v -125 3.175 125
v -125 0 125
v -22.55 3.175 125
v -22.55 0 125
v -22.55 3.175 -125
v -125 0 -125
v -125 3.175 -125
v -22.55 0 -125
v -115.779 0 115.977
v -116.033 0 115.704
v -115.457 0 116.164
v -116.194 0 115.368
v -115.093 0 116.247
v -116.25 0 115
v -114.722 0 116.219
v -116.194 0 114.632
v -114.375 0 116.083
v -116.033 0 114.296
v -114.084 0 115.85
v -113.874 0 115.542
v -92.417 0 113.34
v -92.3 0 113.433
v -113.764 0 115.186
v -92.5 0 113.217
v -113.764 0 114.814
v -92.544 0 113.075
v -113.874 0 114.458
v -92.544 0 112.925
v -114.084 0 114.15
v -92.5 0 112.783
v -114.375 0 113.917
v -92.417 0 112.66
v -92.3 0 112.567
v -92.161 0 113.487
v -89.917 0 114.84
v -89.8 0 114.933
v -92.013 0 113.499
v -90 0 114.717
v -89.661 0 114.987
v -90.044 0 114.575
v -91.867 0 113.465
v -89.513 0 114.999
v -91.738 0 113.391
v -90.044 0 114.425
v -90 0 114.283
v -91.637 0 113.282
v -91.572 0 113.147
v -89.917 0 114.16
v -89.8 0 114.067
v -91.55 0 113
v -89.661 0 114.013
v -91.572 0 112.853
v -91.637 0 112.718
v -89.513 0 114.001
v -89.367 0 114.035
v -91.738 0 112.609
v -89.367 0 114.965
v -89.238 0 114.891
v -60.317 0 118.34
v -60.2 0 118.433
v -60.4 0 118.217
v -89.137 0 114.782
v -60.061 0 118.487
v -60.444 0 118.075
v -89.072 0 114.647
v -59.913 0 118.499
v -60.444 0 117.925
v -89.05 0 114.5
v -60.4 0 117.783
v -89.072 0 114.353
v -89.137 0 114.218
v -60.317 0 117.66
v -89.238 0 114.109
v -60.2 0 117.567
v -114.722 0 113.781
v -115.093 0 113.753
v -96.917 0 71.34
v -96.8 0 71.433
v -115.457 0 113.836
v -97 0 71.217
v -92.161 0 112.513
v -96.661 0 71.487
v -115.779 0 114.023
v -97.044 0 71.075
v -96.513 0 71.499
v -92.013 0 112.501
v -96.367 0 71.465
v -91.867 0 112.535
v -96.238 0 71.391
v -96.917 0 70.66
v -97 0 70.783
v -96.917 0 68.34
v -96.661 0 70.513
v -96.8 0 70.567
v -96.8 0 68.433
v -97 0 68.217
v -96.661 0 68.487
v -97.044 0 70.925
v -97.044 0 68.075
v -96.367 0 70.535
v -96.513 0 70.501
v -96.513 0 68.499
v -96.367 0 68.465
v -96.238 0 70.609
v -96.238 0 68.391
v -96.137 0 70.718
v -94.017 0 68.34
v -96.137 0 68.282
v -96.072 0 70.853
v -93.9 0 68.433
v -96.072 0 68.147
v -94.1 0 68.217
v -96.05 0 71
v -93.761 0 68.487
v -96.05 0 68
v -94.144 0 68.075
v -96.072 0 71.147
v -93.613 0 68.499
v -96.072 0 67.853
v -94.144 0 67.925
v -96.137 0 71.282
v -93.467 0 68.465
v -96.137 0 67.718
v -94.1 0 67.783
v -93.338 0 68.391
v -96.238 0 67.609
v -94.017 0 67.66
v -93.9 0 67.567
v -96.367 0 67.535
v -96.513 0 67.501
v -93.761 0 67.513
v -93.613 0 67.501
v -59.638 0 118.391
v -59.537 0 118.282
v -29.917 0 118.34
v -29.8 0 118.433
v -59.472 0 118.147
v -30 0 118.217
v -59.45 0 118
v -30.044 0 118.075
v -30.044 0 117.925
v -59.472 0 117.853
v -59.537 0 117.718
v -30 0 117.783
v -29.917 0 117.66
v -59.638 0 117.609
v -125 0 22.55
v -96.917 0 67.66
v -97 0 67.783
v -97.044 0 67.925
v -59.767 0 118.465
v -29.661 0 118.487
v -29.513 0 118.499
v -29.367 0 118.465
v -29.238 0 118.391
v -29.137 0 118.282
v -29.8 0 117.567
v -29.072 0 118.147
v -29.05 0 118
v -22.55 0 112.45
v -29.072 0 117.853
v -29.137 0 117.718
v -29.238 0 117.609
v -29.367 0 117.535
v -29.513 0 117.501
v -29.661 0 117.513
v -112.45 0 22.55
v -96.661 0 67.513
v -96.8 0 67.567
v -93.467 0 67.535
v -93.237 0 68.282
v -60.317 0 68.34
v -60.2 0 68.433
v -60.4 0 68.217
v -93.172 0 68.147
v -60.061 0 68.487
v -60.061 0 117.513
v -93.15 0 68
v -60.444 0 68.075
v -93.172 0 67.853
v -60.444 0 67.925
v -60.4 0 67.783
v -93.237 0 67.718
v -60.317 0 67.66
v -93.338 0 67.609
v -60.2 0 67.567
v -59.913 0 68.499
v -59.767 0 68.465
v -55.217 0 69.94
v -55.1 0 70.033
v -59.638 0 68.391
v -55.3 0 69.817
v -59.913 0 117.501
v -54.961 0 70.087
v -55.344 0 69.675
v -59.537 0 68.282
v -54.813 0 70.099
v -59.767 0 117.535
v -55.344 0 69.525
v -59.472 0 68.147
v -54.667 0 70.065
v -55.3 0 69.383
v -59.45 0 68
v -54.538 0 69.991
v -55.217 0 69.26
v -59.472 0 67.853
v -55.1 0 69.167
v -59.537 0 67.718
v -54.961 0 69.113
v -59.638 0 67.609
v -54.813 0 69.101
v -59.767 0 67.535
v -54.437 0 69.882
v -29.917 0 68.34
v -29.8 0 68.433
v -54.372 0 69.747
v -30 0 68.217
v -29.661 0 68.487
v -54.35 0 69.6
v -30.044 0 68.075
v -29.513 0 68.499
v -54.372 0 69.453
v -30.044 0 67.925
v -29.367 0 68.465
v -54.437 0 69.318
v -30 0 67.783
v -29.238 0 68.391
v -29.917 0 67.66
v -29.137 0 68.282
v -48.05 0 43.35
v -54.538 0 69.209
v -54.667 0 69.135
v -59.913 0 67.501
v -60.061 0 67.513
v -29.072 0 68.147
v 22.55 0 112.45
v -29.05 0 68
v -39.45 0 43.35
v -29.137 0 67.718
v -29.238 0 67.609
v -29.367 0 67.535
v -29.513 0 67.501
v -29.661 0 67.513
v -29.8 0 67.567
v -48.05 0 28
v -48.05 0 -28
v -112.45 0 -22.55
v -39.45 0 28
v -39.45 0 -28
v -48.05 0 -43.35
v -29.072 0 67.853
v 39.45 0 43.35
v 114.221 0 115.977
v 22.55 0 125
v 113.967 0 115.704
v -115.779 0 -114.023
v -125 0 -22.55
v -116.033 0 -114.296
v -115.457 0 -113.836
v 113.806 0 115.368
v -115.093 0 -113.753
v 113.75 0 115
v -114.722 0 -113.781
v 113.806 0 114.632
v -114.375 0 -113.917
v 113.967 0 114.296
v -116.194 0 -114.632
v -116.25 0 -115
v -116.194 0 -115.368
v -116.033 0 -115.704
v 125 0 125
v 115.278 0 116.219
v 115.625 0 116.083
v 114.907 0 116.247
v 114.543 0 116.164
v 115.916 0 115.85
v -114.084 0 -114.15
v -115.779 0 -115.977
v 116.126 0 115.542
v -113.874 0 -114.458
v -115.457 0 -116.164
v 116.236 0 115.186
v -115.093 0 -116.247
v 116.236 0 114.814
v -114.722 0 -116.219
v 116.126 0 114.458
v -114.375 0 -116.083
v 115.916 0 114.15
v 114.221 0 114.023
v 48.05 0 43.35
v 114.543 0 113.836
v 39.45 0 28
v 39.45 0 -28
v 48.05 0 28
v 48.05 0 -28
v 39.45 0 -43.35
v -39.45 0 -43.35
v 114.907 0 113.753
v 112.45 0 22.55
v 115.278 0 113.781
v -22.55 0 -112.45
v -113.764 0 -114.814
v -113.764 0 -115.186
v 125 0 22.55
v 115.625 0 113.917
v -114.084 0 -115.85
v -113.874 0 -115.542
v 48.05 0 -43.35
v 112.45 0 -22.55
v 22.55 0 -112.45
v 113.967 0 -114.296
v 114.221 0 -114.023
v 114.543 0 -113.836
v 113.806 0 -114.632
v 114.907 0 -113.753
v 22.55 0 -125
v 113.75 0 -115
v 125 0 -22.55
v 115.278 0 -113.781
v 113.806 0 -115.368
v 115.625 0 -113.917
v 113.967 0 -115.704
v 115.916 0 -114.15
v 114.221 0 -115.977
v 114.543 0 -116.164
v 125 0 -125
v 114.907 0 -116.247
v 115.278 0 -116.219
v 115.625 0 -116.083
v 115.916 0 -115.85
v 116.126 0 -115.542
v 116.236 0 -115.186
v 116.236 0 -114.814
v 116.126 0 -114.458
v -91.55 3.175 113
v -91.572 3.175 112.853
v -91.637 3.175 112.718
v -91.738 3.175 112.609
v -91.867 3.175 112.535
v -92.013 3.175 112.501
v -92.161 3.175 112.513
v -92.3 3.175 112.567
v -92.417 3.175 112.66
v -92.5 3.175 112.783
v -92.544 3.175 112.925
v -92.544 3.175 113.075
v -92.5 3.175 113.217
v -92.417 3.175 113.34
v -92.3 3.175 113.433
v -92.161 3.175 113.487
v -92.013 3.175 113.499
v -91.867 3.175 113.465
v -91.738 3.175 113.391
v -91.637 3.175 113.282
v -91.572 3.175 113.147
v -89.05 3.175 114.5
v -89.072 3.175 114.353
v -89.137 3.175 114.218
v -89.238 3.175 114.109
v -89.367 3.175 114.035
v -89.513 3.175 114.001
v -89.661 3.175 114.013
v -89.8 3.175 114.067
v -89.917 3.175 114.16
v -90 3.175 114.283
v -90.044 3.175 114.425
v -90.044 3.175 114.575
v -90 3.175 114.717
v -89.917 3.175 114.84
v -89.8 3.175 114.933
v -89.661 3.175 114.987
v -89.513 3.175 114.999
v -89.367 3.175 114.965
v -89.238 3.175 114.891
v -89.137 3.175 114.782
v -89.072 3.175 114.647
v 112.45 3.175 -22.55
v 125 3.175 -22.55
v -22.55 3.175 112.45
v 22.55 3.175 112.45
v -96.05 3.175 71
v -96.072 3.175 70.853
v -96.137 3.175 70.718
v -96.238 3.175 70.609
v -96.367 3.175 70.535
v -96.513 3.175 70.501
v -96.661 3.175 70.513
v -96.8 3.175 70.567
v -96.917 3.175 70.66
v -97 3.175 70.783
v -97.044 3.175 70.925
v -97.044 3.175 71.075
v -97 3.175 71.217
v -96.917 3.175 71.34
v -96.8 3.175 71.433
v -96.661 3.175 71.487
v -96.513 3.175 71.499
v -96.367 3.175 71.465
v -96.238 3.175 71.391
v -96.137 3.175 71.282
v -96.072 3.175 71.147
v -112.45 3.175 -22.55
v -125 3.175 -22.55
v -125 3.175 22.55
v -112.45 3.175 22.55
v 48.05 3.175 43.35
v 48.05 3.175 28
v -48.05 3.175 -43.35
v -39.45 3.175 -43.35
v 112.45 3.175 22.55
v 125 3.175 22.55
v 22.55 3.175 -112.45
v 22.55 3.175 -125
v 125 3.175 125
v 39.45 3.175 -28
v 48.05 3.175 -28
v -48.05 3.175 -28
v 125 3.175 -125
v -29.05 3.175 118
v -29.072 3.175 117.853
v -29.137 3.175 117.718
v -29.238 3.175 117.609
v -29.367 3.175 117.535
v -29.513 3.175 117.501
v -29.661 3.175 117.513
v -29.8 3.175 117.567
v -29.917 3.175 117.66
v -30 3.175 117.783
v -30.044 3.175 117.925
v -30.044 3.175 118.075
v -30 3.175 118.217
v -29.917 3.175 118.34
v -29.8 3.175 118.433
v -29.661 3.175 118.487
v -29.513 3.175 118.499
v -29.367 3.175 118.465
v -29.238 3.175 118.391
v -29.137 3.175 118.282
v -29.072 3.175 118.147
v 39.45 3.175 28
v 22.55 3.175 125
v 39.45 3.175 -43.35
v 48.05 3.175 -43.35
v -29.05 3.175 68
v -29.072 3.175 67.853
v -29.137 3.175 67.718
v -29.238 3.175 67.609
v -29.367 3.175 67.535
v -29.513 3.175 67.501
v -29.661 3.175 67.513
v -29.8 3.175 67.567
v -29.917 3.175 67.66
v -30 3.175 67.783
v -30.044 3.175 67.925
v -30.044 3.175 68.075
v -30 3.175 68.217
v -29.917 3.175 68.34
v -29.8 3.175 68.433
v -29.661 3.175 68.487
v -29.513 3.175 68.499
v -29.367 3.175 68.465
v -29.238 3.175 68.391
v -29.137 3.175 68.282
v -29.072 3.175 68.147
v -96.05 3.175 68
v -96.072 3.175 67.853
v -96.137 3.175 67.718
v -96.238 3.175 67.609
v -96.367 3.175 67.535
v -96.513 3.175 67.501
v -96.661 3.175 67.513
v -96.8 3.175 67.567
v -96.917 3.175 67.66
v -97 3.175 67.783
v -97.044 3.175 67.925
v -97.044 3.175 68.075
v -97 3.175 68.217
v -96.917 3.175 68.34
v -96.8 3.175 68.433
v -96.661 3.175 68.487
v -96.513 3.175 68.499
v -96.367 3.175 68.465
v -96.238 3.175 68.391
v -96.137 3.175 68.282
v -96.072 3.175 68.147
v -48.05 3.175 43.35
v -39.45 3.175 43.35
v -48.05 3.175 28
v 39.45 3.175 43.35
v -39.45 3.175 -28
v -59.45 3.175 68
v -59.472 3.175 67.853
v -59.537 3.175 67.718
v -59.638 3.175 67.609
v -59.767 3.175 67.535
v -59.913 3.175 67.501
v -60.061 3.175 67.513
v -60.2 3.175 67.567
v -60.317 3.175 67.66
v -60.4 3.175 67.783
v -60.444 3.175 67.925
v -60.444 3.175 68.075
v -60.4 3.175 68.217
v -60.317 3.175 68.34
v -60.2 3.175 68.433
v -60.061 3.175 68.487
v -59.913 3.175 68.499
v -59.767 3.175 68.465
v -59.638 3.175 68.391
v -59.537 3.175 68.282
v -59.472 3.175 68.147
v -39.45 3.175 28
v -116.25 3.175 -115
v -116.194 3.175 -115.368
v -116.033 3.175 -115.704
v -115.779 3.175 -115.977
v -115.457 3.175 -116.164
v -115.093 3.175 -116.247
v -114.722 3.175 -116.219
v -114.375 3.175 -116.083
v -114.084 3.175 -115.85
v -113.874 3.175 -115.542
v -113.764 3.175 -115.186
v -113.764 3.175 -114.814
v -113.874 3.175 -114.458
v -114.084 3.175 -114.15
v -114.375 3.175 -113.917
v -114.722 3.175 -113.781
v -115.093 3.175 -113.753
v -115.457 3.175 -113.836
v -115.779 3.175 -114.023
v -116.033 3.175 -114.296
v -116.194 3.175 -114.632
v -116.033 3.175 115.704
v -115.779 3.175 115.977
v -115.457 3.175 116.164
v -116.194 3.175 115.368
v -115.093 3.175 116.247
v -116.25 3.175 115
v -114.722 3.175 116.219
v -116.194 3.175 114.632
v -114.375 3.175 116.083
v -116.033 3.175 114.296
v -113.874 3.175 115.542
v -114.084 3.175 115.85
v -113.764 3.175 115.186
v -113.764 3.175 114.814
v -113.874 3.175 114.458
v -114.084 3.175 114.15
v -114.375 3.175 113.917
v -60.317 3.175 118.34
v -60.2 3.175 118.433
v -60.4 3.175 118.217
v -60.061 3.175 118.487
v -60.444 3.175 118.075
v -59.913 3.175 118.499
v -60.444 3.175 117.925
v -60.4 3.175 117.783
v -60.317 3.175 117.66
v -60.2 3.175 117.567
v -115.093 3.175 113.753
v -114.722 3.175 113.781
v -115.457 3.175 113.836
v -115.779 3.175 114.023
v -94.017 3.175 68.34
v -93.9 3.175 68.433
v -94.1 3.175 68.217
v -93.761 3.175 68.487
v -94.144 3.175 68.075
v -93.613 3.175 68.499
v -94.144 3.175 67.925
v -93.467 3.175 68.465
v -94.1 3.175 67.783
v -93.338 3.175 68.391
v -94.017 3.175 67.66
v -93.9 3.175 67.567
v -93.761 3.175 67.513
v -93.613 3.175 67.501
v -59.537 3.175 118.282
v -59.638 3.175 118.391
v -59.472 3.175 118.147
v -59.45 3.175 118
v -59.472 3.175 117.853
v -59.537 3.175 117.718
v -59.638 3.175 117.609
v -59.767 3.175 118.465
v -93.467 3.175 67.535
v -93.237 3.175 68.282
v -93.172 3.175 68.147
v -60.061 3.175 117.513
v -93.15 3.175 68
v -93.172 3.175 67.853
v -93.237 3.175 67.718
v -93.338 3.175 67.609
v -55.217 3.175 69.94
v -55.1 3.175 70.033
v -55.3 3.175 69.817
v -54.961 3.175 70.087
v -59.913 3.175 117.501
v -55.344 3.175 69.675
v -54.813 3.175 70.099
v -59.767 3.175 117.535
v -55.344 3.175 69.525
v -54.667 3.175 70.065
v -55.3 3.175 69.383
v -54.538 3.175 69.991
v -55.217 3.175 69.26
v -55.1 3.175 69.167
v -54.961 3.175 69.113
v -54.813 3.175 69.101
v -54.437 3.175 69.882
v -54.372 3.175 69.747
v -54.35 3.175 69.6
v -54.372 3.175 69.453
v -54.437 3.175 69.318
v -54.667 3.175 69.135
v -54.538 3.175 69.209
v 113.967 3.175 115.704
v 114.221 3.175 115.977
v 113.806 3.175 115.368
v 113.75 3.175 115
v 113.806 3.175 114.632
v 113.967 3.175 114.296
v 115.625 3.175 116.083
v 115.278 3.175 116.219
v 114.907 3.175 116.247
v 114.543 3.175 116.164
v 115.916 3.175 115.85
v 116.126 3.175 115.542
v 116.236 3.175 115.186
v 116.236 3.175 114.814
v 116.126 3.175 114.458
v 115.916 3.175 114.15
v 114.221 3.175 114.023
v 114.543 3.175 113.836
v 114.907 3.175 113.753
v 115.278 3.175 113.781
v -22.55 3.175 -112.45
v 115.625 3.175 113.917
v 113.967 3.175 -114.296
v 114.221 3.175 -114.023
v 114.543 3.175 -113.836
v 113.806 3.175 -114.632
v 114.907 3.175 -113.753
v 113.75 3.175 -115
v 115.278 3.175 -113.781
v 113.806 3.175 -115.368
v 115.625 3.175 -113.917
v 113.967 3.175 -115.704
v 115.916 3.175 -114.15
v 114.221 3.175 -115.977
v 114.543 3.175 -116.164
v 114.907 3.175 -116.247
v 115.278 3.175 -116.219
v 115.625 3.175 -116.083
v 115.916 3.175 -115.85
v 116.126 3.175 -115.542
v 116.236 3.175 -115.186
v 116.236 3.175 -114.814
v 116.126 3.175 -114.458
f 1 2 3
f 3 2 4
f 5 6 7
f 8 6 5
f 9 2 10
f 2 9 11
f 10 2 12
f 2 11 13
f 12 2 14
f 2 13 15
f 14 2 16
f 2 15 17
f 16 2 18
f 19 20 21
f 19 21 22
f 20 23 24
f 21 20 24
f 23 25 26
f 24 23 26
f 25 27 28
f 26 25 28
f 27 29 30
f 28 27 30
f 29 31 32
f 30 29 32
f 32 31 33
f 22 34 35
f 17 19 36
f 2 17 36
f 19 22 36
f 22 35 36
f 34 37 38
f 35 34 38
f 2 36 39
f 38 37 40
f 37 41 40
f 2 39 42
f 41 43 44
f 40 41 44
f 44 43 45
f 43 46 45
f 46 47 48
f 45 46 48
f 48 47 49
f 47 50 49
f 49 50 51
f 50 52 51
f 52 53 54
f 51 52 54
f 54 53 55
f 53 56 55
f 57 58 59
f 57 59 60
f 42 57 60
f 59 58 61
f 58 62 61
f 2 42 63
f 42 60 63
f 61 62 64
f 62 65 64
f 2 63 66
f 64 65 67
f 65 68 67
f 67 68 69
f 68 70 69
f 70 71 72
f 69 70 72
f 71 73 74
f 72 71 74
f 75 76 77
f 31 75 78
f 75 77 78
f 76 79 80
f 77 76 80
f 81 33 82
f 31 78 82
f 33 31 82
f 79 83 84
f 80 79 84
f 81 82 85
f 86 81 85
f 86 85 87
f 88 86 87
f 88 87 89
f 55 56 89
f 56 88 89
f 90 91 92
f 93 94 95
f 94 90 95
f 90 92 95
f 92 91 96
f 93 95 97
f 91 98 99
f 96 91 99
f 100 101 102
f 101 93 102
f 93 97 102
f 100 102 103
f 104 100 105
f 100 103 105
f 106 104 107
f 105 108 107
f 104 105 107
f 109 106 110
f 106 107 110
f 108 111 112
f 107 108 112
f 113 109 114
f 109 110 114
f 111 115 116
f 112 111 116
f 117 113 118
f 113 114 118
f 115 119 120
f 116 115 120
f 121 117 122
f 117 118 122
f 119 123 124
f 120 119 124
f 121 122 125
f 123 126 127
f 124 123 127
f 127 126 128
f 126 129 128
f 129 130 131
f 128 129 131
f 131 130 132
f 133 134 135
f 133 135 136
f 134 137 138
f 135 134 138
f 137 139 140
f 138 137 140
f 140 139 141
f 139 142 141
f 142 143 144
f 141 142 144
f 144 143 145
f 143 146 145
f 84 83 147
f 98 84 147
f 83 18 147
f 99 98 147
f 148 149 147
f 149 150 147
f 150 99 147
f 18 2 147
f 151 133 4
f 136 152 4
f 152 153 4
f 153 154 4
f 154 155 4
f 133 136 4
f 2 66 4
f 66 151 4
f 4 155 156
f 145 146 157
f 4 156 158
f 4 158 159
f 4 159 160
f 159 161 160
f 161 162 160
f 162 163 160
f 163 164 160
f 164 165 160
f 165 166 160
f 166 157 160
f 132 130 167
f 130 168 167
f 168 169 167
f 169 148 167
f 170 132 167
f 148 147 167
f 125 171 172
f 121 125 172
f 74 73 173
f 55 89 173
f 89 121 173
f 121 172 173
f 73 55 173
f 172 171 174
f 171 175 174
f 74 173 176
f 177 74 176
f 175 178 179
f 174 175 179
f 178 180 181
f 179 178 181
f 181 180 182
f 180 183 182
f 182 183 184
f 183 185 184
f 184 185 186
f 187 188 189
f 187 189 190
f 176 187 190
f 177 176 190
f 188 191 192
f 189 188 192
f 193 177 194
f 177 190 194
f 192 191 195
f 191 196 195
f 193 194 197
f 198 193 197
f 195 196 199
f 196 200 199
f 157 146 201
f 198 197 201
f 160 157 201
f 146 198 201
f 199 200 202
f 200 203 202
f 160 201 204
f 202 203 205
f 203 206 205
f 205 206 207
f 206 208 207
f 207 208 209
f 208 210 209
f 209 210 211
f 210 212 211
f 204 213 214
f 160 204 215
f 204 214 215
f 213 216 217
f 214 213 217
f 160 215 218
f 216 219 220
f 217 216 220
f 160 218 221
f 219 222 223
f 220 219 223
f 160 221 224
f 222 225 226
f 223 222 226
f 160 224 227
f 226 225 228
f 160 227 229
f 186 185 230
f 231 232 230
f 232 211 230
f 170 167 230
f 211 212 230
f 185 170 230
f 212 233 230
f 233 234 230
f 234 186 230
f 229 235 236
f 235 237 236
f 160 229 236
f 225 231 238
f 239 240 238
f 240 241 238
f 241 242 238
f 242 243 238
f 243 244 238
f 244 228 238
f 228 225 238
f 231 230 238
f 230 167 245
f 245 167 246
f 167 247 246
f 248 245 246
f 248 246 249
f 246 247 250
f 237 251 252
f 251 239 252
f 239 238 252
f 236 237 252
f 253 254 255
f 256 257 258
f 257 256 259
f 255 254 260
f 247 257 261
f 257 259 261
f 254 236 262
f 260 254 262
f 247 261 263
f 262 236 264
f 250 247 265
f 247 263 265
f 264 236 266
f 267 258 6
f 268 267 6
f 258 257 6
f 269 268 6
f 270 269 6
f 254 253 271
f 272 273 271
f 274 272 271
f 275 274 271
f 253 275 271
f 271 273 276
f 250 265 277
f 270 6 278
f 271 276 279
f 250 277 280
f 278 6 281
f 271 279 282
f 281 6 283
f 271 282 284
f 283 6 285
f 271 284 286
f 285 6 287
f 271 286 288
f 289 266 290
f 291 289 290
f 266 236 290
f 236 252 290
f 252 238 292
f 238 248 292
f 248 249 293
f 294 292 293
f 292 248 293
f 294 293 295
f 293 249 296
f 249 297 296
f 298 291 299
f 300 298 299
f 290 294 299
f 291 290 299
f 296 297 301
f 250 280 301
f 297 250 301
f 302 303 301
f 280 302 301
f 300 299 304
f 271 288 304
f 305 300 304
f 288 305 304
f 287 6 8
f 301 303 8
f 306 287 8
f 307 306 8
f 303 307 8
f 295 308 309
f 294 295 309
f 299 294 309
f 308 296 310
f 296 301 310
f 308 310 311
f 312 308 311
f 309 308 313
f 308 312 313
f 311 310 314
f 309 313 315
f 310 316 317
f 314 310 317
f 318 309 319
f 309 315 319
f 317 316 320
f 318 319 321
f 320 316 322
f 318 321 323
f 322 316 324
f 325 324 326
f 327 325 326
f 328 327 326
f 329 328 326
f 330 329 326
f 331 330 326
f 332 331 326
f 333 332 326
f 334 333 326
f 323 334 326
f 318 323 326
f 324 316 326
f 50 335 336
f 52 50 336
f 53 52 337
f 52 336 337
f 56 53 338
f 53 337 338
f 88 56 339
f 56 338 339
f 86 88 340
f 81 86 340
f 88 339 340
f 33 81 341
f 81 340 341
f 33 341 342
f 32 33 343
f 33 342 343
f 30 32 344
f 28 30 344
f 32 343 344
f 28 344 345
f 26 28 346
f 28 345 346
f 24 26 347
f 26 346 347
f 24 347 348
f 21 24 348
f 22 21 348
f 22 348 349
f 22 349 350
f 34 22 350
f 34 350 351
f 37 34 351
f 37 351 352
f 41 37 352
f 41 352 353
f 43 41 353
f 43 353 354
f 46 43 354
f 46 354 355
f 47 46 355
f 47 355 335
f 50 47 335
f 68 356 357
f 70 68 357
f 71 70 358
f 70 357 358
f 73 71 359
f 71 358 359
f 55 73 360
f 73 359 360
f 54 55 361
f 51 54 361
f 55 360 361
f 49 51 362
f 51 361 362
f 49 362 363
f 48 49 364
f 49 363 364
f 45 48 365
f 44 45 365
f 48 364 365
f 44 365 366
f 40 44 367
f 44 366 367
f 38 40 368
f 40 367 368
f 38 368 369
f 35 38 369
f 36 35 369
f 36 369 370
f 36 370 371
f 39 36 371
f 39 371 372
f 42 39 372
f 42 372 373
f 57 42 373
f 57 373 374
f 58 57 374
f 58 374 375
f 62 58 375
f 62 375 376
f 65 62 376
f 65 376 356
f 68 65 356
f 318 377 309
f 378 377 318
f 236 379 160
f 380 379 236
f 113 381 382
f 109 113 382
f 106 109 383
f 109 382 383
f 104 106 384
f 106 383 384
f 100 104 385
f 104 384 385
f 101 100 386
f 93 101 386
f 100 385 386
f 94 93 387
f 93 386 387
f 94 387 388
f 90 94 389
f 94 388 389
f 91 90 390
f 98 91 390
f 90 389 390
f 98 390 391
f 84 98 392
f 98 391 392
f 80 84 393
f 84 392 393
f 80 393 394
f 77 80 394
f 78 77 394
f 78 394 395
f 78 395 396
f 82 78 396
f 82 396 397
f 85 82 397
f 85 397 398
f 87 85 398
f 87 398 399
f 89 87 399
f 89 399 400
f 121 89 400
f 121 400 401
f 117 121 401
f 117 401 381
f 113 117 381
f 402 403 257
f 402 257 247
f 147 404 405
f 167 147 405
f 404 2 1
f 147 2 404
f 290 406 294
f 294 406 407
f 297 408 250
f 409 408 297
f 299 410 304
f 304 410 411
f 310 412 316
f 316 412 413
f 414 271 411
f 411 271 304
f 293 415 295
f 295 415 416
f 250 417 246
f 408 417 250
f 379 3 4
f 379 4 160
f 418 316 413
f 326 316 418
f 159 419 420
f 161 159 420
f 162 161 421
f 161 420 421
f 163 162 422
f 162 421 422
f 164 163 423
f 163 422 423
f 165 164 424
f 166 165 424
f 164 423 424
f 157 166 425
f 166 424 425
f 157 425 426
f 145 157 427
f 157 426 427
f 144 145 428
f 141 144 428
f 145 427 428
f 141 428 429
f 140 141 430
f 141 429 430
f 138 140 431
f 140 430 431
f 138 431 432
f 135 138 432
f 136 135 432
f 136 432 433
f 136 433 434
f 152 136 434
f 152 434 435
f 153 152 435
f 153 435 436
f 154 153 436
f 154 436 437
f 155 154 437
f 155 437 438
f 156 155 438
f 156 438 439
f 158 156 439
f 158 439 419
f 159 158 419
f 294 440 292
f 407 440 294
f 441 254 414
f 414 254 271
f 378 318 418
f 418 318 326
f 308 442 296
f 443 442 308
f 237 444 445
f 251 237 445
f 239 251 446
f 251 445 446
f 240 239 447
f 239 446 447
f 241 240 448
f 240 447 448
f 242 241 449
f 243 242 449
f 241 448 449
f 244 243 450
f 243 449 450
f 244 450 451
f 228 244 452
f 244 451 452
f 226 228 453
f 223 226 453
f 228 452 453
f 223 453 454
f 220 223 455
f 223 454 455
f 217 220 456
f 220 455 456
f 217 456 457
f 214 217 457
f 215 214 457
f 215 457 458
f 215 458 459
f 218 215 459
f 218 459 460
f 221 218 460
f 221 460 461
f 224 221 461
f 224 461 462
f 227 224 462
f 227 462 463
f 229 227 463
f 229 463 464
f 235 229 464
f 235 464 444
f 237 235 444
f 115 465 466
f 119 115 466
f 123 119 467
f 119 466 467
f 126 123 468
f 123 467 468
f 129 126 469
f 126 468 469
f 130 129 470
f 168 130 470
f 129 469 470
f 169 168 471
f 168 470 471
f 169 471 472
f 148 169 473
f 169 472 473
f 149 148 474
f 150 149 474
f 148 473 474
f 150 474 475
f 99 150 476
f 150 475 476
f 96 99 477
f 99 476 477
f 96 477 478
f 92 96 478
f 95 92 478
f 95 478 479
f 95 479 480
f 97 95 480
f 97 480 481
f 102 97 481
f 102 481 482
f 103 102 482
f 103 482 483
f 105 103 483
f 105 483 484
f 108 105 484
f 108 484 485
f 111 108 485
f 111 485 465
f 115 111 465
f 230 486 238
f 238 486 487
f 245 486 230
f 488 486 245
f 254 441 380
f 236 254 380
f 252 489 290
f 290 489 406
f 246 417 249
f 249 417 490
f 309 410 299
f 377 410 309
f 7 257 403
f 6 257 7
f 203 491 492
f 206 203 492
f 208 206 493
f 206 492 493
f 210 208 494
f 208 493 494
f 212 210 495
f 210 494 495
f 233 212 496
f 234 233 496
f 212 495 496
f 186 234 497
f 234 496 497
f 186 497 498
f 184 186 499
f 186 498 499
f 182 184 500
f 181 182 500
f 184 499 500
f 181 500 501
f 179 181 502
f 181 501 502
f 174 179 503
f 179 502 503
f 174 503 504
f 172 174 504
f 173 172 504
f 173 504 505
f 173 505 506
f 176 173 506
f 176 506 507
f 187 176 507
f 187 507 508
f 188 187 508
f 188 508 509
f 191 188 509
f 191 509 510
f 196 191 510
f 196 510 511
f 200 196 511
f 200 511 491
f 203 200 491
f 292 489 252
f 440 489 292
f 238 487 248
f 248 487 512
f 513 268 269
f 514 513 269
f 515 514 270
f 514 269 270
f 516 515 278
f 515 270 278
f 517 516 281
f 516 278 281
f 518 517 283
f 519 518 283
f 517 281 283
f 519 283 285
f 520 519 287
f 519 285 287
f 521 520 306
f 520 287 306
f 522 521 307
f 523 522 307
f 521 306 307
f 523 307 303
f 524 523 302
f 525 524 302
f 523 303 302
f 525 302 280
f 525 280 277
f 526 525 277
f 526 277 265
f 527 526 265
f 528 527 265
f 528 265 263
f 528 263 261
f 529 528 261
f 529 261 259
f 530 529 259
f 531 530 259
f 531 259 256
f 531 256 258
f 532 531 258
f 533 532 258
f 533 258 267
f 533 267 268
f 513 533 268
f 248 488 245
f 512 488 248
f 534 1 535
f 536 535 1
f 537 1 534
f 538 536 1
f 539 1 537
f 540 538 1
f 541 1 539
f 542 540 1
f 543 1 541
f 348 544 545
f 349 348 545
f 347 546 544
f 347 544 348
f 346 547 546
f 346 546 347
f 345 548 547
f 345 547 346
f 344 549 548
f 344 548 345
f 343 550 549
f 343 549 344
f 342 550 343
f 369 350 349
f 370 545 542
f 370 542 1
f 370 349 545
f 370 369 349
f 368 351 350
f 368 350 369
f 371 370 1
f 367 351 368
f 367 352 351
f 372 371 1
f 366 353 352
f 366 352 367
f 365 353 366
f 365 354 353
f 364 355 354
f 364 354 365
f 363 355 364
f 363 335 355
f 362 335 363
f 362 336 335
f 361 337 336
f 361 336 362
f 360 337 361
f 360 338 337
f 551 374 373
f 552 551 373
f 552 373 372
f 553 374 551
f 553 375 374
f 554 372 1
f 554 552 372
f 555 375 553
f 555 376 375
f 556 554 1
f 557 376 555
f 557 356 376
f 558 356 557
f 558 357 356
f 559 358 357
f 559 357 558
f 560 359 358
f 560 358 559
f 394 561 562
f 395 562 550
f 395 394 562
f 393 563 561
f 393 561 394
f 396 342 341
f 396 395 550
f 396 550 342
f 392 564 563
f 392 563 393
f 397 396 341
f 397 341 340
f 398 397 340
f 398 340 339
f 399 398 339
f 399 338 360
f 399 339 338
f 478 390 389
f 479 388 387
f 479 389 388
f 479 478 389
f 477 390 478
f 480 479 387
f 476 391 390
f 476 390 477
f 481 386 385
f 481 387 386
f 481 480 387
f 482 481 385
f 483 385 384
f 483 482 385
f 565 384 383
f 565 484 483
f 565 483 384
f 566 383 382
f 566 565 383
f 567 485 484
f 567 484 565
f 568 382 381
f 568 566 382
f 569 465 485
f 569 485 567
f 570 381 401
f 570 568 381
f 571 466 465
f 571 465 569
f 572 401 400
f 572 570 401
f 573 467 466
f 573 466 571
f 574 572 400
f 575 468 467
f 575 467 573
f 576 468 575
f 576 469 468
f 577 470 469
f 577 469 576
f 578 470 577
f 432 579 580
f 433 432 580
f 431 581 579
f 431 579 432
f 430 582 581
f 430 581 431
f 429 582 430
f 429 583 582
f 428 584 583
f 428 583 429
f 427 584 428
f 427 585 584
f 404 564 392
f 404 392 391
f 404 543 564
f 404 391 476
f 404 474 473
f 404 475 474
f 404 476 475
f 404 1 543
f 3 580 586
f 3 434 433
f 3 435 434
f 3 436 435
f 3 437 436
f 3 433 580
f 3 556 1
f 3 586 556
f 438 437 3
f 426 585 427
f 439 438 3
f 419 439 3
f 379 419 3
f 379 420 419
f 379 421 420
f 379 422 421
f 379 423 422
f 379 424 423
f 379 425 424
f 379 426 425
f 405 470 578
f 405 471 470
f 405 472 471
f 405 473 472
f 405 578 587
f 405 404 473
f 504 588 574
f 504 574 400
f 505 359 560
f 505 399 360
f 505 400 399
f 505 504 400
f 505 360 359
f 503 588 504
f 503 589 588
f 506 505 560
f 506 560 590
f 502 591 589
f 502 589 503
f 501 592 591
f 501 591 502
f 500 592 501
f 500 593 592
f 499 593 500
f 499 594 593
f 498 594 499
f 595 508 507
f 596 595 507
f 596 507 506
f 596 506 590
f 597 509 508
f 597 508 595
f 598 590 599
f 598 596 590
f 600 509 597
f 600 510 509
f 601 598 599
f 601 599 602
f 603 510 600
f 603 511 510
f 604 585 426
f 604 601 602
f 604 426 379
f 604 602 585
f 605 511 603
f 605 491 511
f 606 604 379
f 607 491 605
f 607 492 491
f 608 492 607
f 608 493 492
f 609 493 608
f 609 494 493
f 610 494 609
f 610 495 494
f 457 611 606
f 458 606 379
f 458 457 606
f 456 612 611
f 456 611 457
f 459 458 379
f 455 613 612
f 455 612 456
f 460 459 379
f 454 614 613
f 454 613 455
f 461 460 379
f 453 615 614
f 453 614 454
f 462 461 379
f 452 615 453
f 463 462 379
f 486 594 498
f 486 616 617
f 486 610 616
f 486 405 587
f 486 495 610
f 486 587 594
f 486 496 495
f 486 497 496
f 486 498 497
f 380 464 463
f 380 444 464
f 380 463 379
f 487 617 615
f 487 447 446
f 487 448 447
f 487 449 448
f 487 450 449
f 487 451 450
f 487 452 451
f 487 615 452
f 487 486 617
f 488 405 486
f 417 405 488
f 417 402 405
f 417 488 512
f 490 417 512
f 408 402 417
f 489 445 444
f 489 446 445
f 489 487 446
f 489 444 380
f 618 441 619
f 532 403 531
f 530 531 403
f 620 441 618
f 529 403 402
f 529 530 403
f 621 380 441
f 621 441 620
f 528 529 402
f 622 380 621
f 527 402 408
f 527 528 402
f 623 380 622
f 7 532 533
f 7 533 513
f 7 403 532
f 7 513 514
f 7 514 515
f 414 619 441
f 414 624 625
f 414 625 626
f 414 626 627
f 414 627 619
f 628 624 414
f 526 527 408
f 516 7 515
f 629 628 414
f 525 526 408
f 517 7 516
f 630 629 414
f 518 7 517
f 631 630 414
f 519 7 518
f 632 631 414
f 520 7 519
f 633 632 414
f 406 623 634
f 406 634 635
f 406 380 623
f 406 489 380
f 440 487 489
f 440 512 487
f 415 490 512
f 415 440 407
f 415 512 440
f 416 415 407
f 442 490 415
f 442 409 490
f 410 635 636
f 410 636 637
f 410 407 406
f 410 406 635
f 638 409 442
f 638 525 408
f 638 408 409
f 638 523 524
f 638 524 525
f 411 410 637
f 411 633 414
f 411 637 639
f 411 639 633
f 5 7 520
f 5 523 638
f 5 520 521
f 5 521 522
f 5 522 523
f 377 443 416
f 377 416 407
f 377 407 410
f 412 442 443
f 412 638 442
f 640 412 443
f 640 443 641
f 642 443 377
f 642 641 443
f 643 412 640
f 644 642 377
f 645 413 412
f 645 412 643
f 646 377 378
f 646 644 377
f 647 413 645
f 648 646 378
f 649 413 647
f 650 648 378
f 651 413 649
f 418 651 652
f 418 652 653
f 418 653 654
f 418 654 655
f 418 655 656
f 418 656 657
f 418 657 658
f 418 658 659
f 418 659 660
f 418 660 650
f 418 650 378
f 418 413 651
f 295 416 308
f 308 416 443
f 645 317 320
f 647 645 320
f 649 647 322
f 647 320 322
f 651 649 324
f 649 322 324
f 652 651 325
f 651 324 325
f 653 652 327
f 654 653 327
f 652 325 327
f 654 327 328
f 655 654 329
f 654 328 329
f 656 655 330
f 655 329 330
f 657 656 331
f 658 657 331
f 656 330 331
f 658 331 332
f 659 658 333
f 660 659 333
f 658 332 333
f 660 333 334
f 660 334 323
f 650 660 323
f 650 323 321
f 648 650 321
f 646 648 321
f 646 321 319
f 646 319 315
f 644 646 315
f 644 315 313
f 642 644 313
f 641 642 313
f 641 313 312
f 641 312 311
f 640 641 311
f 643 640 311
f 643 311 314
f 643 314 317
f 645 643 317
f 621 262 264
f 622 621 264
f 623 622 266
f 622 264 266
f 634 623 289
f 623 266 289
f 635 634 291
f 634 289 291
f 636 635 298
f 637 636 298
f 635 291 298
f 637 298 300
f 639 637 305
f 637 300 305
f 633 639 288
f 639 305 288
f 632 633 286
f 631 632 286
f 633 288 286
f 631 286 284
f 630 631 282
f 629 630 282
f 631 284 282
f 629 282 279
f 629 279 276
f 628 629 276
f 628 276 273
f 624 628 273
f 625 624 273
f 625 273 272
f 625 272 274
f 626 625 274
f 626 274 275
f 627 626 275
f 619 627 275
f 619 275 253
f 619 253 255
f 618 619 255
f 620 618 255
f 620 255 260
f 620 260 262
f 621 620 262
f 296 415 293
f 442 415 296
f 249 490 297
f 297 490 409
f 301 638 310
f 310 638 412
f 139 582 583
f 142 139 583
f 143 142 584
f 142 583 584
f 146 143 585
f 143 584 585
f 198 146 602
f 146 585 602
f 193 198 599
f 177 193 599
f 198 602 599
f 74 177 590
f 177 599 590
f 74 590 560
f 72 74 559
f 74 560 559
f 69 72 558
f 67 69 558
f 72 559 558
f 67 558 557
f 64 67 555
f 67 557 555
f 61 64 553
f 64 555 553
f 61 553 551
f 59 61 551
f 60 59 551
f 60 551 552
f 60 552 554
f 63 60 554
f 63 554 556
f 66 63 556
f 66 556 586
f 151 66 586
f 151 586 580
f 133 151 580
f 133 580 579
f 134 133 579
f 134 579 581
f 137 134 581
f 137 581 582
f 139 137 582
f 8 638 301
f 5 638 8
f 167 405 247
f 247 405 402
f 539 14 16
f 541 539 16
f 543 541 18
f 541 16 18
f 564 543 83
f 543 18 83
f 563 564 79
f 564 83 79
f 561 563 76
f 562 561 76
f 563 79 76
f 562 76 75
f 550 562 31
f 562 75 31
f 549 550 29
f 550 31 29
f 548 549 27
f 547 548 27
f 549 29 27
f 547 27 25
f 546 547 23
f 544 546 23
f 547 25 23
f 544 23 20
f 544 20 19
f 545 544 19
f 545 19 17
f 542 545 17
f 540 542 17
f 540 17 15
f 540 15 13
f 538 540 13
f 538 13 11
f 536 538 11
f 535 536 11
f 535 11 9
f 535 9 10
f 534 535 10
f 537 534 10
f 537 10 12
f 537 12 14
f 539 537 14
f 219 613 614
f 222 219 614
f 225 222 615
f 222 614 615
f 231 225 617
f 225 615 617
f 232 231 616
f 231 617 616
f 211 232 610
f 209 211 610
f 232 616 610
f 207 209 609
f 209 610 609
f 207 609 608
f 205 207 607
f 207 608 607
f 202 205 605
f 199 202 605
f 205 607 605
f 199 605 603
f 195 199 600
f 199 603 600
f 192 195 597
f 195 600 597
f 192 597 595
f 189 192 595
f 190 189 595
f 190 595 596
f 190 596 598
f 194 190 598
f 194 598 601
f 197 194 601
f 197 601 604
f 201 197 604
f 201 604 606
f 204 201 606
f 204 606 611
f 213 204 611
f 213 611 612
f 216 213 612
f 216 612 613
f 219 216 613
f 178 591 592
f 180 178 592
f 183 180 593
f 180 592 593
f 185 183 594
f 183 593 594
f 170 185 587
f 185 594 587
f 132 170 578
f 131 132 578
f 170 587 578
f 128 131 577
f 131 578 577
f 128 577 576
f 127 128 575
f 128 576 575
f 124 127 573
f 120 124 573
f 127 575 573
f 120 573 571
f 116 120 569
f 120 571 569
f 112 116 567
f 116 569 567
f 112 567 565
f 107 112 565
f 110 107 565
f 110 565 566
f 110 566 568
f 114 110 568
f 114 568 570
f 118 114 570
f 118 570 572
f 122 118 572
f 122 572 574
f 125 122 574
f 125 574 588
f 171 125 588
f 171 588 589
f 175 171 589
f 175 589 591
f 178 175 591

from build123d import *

# Parameters (mm, degrees)
SKETCH2_W           = 250
SKETCH2_H           = 250
BOSS_EXTRUDE1_DEPTH = 3.175
SKETCH3_W           = 8.6
SKETCH3_H           = 15.35
CUT_EXTRUDE1_DEPTH  = 10
SKETCH4_W           = 45.1
SKETCH4_H           = 25.1
SKETCH4_W_2         = 25.1
SKETCH4_H_2         = 45.1
CUT_EXTRUDE2_DEPTH  = 10
M3_TAPPED_HOLE1_D   = 2.5
M3_TAPPED_HOLE2_D   = 2.5
SKETCH9_R           = 0.5
CUT_EXTRUDE3_DEPTH  = 4.175


with BuildPart() as part:
    # Sketch2 → Boss-Extrude1 (new body)
    with BuildSketch(Plane(origin=(0, 0, 0), x_dir=(1, 0, 0), z_dir=(0, 1, 0))):
        Rectangle(SKETCH2_W, SKETCH2_H)
    extrude(amount=BOSS_EXTRUDE1_DEPTH)

    # Sketch3 → Cut-Extrude1 (cut)
    with BuildSketch(Plane(origin=(0, 3.175, 0), x_dir=(1, 0, 0), z_dir=(0, 1, 0))):
        with Locations((-43.75, 35.675)):
            Rectangle(SKETCH3_W, SKETCH3_H)
        with Locations((-43.75, -35.675)):
            Rectangle(SKETCH3_W, SKETCH3_H)
        with Locations((43.75, -35.675)):
            Rectangle(SKETCH3_W, SKETCH3_H)
        with Locations((43.75, 35.675)):
            Rectangle(SKETCH3_W, SKETCH3_H)
    extrude(amount=-CUT_EXTRUDE1_DEPTH, mode=Mode.SUBTRACT)

    # Sketch4 → Cut-Extrude2 (cut)
    with BuildSketch(Plane(origin=(0, 3.175, 0), x_dir=(1, 0, 0), z_dir=(0, 1, 0))):
        with Locations((0, 125)):
            Rectangle(SKETCH4_W, SKETCH4_H)
        with Locations((125, 0)):
            Rectangle(SKETCH4_W_2, SKETCH4_H_2)
        with Locations((0, -125)):
            Rectangle(SKETCH4_W, SKETCH4_H)
        with Locations((-125, 0)):
            Rectangle(SKETCH4_W_2, SKETCH4_H_2)
    extrude(amount=-CUT_EXTRUDE2_DEPTH, mode=Mode.SUBTRACT)

    # M3 Tapped Hole1 (through all)
    with Locations(Plane(origin=(0, 3.175, 0), x_dir=(1, 0, 0), z_dir=(0, 1, 0))):
        with Locations((-115, 115)):
            Hole(M3_TAPPED_HOLE1_D / 2)

    # M3 Tapped Hole2 (through all)
    with Locations(Plane(origin=(0, 3.175, 0), x_dir=(1, 0, 0), z_dir=(0, 1, 0))):
        with Locations((115, 115), (115, -115), (-115, -115)):
            Hole(M3_TAPPED_HOLE2_D / 2)

    # Sketch9 → Cut-Extrude3 (cut, through all)
    with BuildSketch(Plane(origin=(0, 3.175, 0), x_dir=(1, 0, 0), z_dir=(0, 1, 0))):
        with Locations((-92.05, -113)):
            Circle(SKETCH9_R)
        with Locations((-89.55, -114.5)):
            Circle(SKETCH9_R)
        with Locations((-59.95, -118)):
            Circle(SKETCH9_R)
        with Locations((-29.55, -118)):
            Circle(SKETCH9_R)
        with Locations((-29.55, -68)):
            Circle(SKETCH9_R)
        with Locations((-54.85, -69.6)):
            Circle(SKETCH9_R)
        with Locations((-59.95, -68)):
            Circle(SKETCH9_R)
        with Locations((-96.55, -68)):
            Circle(SKETCH9_R)
        with Locations((-93.65, -68)):
            Circle(SKETCH9_R)
        with Locations((-96.55, -71)):
            Circle(SKETCH9_R)
    extrude(amount=-CUT_EXTRUDE3_DEPTH, mode=Mode.SUBTRACT)


solid = part.part
